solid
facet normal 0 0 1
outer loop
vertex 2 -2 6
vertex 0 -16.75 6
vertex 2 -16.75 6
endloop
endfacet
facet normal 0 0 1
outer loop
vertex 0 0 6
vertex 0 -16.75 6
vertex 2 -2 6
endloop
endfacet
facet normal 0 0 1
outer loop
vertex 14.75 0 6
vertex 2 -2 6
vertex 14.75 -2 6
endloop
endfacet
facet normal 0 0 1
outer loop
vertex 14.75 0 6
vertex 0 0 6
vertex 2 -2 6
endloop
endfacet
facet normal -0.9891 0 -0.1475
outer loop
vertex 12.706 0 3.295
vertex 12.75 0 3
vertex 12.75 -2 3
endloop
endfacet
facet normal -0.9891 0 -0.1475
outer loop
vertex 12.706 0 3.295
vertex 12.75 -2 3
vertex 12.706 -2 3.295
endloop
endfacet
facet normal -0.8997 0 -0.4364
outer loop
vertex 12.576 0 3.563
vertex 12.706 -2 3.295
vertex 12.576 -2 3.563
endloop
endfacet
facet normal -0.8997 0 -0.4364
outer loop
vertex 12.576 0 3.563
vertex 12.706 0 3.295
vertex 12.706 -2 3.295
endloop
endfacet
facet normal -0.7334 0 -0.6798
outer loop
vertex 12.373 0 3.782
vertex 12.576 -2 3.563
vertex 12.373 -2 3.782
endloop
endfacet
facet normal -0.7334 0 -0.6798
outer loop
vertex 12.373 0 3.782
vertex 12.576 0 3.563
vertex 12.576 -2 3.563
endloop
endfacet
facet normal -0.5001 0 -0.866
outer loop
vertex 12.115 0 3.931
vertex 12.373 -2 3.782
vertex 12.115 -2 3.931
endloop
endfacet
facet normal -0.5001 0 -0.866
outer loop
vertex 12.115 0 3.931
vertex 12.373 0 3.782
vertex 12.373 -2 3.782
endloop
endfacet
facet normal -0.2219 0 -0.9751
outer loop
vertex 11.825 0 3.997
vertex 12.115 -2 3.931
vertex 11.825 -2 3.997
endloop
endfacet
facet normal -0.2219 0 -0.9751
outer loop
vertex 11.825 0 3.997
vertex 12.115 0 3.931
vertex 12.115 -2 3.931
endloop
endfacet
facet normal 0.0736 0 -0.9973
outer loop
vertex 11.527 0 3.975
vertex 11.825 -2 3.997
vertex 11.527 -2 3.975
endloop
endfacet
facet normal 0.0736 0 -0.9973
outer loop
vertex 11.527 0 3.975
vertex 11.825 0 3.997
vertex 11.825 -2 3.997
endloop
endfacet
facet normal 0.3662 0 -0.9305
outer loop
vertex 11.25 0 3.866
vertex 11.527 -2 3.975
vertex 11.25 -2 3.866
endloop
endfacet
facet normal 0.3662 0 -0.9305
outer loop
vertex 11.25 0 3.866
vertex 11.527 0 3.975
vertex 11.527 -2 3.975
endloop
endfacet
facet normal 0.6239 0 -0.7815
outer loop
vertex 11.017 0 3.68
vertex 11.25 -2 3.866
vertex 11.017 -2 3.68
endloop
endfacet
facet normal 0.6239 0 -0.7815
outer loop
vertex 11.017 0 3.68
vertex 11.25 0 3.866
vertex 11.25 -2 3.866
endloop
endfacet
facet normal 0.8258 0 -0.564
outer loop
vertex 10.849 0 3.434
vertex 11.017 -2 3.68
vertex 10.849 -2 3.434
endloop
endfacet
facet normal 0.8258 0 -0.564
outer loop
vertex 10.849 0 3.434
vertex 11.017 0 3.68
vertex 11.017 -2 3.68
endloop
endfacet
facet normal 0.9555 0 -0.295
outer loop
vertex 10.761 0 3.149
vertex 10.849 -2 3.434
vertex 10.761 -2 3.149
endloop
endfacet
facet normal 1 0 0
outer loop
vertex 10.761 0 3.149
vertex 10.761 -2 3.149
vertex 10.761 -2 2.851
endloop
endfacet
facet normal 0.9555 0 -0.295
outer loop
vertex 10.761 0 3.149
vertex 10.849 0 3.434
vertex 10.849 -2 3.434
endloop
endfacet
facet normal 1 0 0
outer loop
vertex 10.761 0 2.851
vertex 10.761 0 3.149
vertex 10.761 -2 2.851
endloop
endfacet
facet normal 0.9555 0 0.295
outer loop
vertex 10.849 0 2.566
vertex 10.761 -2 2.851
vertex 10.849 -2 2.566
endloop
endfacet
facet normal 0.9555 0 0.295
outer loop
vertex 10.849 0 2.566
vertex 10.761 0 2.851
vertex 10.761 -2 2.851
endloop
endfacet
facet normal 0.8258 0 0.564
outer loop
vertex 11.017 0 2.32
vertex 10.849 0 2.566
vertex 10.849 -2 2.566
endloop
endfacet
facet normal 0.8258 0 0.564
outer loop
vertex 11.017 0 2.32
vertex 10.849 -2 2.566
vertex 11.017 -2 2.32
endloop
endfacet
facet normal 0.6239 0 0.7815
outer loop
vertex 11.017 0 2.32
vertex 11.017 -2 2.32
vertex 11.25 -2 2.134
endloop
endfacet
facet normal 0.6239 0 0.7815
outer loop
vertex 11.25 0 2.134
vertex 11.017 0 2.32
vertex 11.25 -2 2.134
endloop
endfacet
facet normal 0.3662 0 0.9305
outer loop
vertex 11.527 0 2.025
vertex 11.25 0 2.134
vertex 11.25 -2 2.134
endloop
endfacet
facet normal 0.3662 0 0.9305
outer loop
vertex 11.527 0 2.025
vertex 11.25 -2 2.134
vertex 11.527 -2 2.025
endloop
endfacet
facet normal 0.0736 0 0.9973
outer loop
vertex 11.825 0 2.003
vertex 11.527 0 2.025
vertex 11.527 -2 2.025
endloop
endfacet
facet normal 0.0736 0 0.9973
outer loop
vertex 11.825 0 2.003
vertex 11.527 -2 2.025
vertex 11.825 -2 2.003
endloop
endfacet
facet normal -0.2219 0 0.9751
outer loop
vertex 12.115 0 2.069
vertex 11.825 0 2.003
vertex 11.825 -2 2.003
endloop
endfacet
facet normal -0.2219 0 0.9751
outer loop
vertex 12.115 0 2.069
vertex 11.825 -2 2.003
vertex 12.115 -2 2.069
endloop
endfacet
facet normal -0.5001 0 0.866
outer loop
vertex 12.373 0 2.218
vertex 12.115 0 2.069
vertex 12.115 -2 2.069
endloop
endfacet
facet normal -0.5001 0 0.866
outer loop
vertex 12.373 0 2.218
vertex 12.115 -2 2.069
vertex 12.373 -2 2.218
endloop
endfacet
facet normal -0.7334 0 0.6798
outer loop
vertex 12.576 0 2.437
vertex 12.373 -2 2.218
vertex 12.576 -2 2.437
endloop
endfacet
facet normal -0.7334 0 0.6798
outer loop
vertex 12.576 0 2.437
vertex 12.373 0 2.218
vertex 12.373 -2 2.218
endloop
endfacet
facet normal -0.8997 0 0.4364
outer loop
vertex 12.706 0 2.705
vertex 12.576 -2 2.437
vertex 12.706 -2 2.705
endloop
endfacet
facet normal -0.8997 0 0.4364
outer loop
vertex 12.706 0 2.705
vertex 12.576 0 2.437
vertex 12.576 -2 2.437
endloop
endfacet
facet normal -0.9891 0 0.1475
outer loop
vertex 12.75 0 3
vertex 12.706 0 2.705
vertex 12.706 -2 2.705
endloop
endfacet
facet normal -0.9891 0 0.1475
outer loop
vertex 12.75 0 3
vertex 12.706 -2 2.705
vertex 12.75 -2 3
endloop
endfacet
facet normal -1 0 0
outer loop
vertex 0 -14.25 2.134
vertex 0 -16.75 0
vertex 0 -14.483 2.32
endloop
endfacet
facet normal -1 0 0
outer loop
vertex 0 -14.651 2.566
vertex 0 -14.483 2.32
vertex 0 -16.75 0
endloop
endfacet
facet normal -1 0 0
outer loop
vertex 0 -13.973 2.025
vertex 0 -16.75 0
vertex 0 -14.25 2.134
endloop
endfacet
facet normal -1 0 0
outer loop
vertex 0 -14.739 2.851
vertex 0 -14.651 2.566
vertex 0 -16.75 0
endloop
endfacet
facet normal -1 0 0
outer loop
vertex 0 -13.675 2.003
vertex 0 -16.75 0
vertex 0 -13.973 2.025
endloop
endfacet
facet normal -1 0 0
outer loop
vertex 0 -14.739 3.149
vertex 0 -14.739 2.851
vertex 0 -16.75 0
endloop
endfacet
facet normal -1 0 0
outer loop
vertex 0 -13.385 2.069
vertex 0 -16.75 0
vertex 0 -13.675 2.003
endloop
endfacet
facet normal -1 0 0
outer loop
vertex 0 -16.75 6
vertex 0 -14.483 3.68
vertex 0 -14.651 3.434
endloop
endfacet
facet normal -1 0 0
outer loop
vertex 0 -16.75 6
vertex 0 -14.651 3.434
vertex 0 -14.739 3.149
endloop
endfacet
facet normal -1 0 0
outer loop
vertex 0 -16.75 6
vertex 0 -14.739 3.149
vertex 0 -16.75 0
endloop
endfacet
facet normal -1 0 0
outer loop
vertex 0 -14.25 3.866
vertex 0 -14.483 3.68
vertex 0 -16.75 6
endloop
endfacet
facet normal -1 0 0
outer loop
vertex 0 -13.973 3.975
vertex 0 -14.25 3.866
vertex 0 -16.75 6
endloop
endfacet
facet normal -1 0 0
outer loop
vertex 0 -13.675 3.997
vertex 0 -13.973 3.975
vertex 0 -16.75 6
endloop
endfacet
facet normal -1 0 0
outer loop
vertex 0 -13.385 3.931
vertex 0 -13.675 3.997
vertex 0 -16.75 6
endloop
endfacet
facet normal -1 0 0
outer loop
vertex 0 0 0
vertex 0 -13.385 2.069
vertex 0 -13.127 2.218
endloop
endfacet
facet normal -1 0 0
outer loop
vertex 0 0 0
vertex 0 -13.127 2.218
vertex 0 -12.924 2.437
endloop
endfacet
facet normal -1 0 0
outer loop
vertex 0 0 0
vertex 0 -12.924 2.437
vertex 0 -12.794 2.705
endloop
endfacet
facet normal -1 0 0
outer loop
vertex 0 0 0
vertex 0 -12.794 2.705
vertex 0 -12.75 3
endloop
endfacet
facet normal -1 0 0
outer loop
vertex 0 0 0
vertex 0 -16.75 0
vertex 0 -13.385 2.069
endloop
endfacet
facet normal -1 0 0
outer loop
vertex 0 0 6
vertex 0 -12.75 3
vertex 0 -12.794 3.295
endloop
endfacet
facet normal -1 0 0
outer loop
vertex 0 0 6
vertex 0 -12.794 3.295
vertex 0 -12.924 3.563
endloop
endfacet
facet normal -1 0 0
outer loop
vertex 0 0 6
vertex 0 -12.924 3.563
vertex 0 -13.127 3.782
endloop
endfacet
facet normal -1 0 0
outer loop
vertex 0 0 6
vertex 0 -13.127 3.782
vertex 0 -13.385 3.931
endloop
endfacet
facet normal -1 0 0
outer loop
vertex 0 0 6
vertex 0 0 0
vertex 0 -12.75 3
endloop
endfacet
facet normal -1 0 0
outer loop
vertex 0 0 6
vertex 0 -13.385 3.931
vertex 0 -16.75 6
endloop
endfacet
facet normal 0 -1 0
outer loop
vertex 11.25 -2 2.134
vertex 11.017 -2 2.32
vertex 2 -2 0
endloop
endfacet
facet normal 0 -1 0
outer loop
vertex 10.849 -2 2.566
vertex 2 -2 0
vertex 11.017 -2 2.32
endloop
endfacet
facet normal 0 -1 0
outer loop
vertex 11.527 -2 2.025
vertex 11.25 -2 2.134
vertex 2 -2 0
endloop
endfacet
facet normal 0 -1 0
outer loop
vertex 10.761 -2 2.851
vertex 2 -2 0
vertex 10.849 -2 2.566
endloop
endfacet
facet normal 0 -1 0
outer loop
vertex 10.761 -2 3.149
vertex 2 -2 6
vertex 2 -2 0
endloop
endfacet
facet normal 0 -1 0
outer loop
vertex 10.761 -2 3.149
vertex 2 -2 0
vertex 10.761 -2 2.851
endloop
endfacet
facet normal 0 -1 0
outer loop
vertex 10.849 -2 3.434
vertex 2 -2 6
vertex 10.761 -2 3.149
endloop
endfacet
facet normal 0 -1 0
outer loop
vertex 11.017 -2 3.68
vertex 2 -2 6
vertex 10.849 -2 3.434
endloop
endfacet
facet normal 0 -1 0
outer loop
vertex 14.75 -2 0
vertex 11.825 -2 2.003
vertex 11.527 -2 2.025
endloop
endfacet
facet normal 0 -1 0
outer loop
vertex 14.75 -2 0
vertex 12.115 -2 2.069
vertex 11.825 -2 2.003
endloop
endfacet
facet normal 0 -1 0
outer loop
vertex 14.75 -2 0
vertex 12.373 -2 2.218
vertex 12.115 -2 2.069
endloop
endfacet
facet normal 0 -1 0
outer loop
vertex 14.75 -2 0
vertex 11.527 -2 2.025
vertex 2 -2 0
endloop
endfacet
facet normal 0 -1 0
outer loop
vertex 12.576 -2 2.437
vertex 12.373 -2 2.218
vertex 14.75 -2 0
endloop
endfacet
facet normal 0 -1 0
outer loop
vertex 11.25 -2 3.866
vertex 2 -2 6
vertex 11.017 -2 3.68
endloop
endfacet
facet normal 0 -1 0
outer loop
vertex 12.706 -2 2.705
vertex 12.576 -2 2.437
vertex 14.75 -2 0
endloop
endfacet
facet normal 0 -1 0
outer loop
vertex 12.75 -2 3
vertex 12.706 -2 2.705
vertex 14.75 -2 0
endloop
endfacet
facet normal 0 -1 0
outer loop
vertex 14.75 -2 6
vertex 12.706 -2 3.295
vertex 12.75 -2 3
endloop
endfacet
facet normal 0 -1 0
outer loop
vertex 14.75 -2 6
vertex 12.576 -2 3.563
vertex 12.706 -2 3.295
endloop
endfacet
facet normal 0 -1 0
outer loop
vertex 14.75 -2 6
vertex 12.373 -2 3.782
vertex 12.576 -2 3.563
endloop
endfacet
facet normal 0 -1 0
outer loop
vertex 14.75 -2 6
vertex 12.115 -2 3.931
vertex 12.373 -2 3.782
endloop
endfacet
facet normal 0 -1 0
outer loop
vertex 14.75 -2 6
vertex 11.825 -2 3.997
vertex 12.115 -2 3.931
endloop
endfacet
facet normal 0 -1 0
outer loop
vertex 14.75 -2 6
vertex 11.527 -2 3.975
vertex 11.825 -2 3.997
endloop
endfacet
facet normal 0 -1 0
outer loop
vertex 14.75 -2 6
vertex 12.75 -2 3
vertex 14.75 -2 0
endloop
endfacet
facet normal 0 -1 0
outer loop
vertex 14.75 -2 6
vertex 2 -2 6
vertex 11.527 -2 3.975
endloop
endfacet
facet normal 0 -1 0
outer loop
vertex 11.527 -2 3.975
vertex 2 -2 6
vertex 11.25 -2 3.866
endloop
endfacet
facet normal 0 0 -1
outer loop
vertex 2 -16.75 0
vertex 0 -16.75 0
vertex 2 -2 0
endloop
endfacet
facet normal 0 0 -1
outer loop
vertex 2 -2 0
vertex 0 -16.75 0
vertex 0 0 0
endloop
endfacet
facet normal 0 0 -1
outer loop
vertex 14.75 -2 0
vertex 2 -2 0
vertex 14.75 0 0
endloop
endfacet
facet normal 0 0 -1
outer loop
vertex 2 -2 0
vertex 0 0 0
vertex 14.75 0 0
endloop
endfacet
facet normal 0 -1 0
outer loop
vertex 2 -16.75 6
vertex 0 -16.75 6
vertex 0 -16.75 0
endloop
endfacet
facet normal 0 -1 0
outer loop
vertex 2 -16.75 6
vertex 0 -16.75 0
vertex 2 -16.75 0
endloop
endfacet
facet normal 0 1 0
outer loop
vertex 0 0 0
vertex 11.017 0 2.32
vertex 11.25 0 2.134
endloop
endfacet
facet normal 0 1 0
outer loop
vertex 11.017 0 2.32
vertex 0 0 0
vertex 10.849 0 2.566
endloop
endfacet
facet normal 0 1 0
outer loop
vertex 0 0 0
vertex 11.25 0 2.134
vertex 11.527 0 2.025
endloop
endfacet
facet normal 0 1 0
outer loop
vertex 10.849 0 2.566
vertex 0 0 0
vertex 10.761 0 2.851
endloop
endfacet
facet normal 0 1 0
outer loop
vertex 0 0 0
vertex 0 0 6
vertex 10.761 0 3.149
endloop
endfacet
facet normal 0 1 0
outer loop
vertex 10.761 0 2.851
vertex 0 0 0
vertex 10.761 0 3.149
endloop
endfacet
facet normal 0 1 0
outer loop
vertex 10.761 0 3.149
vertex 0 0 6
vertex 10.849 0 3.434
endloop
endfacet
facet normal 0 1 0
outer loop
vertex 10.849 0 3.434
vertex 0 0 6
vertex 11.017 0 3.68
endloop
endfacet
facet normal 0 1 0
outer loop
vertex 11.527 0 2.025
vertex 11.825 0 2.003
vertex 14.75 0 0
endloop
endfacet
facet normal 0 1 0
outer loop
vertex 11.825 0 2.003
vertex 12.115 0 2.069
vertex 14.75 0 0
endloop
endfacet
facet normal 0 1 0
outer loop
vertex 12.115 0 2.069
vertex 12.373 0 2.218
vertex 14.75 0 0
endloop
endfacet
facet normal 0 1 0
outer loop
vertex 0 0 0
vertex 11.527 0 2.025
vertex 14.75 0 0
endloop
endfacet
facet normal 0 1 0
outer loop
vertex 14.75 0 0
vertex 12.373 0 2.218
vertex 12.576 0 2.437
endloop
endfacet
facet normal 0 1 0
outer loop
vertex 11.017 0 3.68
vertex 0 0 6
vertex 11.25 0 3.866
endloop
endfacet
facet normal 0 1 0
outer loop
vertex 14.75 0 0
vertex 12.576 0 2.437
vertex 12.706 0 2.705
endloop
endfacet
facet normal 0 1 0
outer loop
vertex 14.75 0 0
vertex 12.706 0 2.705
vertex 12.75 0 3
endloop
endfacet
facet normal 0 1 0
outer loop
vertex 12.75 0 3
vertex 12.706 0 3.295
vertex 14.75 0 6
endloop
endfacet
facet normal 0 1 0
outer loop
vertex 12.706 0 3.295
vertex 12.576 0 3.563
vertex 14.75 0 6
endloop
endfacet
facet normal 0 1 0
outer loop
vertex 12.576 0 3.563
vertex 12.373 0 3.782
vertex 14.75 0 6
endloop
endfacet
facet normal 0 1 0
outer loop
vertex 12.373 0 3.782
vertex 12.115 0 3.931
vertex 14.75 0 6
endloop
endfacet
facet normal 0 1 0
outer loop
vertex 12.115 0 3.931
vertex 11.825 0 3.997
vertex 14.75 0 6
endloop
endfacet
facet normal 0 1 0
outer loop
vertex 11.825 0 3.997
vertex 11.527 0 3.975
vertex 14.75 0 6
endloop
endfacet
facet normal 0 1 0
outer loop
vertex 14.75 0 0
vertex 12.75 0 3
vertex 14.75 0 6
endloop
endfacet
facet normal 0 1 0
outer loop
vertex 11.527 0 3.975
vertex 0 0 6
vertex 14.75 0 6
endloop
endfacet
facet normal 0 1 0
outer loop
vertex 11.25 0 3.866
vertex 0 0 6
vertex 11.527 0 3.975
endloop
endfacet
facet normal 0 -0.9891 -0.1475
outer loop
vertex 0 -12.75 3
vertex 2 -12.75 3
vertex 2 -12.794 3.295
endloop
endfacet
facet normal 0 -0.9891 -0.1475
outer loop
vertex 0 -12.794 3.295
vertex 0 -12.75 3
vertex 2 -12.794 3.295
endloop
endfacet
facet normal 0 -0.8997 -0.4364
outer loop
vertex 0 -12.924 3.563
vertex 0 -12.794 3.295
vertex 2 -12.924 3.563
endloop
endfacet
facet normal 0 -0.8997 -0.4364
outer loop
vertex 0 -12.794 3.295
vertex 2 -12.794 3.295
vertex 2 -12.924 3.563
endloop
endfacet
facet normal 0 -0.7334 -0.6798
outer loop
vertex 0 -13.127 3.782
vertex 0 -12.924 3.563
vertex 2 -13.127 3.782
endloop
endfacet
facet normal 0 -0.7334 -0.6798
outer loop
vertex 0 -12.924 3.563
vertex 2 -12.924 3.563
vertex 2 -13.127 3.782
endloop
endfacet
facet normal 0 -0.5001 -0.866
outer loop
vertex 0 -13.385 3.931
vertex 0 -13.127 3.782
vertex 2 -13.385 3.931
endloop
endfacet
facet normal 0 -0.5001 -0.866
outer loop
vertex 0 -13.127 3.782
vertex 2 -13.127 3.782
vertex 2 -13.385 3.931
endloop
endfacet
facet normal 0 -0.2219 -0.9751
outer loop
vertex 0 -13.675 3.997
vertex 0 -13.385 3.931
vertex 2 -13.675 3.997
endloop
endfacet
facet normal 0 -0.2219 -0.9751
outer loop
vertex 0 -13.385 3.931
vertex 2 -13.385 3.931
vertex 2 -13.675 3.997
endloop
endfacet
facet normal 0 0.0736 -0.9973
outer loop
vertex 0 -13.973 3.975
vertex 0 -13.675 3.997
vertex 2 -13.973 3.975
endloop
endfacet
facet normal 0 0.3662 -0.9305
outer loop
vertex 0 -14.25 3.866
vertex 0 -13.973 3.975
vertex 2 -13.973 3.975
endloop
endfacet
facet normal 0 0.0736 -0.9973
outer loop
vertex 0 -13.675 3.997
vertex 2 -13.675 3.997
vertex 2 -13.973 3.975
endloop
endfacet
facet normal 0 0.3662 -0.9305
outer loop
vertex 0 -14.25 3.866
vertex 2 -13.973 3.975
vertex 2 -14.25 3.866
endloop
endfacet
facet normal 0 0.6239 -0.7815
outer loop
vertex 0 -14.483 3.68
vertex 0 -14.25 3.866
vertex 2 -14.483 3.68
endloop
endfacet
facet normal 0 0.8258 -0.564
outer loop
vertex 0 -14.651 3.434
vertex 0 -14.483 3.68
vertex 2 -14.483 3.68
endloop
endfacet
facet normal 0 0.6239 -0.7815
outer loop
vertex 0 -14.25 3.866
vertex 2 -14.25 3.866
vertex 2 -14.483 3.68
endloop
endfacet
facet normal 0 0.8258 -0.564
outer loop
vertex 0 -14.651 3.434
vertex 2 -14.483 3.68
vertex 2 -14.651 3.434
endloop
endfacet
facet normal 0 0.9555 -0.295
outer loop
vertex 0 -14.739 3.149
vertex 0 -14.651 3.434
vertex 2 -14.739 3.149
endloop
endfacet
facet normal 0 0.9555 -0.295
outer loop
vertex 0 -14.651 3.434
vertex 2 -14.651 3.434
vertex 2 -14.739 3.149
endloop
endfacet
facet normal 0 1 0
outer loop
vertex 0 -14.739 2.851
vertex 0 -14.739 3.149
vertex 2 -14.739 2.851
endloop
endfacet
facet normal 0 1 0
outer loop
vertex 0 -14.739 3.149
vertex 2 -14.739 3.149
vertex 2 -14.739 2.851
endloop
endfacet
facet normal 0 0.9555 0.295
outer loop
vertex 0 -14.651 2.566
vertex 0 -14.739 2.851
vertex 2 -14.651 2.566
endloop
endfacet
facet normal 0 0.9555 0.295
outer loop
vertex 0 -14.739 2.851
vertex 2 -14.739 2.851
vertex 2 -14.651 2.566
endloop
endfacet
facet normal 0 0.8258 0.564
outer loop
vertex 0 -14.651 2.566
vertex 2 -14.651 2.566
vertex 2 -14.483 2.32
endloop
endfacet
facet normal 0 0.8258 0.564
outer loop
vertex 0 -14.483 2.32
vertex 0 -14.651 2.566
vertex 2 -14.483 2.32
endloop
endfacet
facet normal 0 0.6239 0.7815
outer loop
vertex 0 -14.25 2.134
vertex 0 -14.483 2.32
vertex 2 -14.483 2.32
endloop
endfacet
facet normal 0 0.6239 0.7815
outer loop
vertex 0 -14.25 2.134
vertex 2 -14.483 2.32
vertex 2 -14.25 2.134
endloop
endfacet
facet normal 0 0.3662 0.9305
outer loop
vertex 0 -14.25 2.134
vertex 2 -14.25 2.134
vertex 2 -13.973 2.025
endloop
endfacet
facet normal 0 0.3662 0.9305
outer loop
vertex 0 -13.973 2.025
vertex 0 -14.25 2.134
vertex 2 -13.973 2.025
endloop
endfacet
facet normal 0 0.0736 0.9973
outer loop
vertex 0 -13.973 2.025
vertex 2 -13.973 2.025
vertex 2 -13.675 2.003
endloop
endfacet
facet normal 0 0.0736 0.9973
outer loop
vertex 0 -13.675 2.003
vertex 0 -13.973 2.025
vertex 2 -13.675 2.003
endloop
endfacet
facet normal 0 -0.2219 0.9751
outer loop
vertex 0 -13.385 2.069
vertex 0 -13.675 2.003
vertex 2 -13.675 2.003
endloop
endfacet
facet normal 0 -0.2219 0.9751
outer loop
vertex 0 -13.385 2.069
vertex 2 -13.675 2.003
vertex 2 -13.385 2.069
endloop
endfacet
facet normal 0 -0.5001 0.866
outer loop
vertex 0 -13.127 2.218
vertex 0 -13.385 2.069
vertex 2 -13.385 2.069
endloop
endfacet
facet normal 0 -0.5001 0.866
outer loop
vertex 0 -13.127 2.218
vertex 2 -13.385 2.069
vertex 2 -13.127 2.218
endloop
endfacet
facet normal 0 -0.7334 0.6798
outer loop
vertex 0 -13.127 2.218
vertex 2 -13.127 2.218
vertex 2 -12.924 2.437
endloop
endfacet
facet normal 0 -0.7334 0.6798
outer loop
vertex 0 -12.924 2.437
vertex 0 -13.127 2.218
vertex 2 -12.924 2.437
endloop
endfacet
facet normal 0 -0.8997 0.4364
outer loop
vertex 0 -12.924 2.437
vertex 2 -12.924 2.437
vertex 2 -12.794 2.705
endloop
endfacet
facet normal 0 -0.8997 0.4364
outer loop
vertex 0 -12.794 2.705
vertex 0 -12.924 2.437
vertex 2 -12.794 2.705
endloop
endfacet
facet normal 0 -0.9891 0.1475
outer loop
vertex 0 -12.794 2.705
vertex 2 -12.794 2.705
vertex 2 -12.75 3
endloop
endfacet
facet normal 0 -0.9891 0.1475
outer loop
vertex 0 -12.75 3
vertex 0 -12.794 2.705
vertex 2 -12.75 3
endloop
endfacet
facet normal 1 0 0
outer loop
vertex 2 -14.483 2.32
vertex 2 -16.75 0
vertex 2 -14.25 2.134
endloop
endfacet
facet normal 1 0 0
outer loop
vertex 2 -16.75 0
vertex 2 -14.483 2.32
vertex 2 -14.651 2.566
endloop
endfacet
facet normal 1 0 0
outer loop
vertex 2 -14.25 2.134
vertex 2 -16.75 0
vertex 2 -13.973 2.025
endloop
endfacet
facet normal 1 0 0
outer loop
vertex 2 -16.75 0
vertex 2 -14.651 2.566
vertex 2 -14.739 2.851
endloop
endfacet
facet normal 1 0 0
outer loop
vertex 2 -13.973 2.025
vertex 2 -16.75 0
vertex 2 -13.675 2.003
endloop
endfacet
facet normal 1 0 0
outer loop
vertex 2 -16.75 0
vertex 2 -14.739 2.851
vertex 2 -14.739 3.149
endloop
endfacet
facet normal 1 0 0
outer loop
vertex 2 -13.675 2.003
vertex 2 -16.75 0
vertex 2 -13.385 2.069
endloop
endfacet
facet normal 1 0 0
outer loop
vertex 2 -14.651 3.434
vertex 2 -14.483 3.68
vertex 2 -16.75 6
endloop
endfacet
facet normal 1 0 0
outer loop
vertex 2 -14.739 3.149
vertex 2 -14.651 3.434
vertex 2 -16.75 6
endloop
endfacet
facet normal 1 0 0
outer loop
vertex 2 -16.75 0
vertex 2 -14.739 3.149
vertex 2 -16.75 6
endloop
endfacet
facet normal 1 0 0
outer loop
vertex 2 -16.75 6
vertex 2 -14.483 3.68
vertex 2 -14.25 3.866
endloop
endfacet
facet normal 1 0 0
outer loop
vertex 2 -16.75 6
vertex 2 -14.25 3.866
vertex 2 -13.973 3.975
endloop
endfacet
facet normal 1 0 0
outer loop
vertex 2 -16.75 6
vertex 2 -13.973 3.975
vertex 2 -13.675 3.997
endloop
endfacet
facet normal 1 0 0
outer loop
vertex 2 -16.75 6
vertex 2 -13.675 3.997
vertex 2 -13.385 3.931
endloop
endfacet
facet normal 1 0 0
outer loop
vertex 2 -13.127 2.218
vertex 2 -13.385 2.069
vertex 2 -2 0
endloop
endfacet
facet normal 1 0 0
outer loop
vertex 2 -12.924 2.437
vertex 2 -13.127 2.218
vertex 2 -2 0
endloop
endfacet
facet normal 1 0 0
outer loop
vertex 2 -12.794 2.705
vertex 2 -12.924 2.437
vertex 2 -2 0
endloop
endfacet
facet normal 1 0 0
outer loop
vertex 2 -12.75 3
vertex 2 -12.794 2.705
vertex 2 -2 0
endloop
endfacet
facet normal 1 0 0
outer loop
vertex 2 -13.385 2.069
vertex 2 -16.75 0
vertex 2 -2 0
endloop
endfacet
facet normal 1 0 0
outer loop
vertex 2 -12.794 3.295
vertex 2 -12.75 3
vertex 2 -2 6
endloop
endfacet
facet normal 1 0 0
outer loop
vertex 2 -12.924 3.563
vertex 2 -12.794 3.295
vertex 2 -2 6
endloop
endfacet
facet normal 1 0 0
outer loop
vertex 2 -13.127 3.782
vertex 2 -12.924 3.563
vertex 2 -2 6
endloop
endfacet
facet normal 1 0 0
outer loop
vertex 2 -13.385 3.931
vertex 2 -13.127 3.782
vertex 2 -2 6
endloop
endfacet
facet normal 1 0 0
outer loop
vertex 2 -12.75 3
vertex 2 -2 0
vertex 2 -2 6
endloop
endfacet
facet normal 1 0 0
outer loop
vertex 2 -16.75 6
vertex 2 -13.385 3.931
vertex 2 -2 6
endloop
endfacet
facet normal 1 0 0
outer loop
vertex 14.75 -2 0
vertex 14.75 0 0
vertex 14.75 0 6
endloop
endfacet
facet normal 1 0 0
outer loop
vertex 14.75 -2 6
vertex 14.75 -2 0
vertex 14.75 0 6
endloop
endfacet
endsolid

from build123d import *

# Parameters (mm, degrees)
F0_W     = 14.75
F0_H     = 6
F0_R     = 1
F1_DEPTH = 2
F2_W     = 2
F2_H     = 6
F3_DEPTH = 14.75
F4_R     = 1
F5_DEPTH = 25


with BuildPart() as f1:
    # F0 (on Front) → F1 (new body)
    with BuildSketch(Plane.XZ):
        with Locations((7.375, 3)):
            Rectangle(F0_W, F0_H)
        with Locations((11.75, 3)):
            Circle(F0_R, mode=Mode.SUBTRACT)
    extrude(amount=F1_DEPTH)

    # F2 (on face) → F3 (join)
    with BuildSketch(Plane.XZ.offset(2)):
        with Locations((1, 3)):
            Rectangle(F2_W, F2_H)
    extrude(amount=F3_DEPTH)

    # F4 (on face) → F5 (cut)
    with BuildSketch(Plane.YZ.offset(2)):
        with Locations((-13.75, 3)):
            Circle(F4_R)
    extrude(amount=-F5_DEPTH, mode=Mode.SUBTRACT)


solid = f1.part
